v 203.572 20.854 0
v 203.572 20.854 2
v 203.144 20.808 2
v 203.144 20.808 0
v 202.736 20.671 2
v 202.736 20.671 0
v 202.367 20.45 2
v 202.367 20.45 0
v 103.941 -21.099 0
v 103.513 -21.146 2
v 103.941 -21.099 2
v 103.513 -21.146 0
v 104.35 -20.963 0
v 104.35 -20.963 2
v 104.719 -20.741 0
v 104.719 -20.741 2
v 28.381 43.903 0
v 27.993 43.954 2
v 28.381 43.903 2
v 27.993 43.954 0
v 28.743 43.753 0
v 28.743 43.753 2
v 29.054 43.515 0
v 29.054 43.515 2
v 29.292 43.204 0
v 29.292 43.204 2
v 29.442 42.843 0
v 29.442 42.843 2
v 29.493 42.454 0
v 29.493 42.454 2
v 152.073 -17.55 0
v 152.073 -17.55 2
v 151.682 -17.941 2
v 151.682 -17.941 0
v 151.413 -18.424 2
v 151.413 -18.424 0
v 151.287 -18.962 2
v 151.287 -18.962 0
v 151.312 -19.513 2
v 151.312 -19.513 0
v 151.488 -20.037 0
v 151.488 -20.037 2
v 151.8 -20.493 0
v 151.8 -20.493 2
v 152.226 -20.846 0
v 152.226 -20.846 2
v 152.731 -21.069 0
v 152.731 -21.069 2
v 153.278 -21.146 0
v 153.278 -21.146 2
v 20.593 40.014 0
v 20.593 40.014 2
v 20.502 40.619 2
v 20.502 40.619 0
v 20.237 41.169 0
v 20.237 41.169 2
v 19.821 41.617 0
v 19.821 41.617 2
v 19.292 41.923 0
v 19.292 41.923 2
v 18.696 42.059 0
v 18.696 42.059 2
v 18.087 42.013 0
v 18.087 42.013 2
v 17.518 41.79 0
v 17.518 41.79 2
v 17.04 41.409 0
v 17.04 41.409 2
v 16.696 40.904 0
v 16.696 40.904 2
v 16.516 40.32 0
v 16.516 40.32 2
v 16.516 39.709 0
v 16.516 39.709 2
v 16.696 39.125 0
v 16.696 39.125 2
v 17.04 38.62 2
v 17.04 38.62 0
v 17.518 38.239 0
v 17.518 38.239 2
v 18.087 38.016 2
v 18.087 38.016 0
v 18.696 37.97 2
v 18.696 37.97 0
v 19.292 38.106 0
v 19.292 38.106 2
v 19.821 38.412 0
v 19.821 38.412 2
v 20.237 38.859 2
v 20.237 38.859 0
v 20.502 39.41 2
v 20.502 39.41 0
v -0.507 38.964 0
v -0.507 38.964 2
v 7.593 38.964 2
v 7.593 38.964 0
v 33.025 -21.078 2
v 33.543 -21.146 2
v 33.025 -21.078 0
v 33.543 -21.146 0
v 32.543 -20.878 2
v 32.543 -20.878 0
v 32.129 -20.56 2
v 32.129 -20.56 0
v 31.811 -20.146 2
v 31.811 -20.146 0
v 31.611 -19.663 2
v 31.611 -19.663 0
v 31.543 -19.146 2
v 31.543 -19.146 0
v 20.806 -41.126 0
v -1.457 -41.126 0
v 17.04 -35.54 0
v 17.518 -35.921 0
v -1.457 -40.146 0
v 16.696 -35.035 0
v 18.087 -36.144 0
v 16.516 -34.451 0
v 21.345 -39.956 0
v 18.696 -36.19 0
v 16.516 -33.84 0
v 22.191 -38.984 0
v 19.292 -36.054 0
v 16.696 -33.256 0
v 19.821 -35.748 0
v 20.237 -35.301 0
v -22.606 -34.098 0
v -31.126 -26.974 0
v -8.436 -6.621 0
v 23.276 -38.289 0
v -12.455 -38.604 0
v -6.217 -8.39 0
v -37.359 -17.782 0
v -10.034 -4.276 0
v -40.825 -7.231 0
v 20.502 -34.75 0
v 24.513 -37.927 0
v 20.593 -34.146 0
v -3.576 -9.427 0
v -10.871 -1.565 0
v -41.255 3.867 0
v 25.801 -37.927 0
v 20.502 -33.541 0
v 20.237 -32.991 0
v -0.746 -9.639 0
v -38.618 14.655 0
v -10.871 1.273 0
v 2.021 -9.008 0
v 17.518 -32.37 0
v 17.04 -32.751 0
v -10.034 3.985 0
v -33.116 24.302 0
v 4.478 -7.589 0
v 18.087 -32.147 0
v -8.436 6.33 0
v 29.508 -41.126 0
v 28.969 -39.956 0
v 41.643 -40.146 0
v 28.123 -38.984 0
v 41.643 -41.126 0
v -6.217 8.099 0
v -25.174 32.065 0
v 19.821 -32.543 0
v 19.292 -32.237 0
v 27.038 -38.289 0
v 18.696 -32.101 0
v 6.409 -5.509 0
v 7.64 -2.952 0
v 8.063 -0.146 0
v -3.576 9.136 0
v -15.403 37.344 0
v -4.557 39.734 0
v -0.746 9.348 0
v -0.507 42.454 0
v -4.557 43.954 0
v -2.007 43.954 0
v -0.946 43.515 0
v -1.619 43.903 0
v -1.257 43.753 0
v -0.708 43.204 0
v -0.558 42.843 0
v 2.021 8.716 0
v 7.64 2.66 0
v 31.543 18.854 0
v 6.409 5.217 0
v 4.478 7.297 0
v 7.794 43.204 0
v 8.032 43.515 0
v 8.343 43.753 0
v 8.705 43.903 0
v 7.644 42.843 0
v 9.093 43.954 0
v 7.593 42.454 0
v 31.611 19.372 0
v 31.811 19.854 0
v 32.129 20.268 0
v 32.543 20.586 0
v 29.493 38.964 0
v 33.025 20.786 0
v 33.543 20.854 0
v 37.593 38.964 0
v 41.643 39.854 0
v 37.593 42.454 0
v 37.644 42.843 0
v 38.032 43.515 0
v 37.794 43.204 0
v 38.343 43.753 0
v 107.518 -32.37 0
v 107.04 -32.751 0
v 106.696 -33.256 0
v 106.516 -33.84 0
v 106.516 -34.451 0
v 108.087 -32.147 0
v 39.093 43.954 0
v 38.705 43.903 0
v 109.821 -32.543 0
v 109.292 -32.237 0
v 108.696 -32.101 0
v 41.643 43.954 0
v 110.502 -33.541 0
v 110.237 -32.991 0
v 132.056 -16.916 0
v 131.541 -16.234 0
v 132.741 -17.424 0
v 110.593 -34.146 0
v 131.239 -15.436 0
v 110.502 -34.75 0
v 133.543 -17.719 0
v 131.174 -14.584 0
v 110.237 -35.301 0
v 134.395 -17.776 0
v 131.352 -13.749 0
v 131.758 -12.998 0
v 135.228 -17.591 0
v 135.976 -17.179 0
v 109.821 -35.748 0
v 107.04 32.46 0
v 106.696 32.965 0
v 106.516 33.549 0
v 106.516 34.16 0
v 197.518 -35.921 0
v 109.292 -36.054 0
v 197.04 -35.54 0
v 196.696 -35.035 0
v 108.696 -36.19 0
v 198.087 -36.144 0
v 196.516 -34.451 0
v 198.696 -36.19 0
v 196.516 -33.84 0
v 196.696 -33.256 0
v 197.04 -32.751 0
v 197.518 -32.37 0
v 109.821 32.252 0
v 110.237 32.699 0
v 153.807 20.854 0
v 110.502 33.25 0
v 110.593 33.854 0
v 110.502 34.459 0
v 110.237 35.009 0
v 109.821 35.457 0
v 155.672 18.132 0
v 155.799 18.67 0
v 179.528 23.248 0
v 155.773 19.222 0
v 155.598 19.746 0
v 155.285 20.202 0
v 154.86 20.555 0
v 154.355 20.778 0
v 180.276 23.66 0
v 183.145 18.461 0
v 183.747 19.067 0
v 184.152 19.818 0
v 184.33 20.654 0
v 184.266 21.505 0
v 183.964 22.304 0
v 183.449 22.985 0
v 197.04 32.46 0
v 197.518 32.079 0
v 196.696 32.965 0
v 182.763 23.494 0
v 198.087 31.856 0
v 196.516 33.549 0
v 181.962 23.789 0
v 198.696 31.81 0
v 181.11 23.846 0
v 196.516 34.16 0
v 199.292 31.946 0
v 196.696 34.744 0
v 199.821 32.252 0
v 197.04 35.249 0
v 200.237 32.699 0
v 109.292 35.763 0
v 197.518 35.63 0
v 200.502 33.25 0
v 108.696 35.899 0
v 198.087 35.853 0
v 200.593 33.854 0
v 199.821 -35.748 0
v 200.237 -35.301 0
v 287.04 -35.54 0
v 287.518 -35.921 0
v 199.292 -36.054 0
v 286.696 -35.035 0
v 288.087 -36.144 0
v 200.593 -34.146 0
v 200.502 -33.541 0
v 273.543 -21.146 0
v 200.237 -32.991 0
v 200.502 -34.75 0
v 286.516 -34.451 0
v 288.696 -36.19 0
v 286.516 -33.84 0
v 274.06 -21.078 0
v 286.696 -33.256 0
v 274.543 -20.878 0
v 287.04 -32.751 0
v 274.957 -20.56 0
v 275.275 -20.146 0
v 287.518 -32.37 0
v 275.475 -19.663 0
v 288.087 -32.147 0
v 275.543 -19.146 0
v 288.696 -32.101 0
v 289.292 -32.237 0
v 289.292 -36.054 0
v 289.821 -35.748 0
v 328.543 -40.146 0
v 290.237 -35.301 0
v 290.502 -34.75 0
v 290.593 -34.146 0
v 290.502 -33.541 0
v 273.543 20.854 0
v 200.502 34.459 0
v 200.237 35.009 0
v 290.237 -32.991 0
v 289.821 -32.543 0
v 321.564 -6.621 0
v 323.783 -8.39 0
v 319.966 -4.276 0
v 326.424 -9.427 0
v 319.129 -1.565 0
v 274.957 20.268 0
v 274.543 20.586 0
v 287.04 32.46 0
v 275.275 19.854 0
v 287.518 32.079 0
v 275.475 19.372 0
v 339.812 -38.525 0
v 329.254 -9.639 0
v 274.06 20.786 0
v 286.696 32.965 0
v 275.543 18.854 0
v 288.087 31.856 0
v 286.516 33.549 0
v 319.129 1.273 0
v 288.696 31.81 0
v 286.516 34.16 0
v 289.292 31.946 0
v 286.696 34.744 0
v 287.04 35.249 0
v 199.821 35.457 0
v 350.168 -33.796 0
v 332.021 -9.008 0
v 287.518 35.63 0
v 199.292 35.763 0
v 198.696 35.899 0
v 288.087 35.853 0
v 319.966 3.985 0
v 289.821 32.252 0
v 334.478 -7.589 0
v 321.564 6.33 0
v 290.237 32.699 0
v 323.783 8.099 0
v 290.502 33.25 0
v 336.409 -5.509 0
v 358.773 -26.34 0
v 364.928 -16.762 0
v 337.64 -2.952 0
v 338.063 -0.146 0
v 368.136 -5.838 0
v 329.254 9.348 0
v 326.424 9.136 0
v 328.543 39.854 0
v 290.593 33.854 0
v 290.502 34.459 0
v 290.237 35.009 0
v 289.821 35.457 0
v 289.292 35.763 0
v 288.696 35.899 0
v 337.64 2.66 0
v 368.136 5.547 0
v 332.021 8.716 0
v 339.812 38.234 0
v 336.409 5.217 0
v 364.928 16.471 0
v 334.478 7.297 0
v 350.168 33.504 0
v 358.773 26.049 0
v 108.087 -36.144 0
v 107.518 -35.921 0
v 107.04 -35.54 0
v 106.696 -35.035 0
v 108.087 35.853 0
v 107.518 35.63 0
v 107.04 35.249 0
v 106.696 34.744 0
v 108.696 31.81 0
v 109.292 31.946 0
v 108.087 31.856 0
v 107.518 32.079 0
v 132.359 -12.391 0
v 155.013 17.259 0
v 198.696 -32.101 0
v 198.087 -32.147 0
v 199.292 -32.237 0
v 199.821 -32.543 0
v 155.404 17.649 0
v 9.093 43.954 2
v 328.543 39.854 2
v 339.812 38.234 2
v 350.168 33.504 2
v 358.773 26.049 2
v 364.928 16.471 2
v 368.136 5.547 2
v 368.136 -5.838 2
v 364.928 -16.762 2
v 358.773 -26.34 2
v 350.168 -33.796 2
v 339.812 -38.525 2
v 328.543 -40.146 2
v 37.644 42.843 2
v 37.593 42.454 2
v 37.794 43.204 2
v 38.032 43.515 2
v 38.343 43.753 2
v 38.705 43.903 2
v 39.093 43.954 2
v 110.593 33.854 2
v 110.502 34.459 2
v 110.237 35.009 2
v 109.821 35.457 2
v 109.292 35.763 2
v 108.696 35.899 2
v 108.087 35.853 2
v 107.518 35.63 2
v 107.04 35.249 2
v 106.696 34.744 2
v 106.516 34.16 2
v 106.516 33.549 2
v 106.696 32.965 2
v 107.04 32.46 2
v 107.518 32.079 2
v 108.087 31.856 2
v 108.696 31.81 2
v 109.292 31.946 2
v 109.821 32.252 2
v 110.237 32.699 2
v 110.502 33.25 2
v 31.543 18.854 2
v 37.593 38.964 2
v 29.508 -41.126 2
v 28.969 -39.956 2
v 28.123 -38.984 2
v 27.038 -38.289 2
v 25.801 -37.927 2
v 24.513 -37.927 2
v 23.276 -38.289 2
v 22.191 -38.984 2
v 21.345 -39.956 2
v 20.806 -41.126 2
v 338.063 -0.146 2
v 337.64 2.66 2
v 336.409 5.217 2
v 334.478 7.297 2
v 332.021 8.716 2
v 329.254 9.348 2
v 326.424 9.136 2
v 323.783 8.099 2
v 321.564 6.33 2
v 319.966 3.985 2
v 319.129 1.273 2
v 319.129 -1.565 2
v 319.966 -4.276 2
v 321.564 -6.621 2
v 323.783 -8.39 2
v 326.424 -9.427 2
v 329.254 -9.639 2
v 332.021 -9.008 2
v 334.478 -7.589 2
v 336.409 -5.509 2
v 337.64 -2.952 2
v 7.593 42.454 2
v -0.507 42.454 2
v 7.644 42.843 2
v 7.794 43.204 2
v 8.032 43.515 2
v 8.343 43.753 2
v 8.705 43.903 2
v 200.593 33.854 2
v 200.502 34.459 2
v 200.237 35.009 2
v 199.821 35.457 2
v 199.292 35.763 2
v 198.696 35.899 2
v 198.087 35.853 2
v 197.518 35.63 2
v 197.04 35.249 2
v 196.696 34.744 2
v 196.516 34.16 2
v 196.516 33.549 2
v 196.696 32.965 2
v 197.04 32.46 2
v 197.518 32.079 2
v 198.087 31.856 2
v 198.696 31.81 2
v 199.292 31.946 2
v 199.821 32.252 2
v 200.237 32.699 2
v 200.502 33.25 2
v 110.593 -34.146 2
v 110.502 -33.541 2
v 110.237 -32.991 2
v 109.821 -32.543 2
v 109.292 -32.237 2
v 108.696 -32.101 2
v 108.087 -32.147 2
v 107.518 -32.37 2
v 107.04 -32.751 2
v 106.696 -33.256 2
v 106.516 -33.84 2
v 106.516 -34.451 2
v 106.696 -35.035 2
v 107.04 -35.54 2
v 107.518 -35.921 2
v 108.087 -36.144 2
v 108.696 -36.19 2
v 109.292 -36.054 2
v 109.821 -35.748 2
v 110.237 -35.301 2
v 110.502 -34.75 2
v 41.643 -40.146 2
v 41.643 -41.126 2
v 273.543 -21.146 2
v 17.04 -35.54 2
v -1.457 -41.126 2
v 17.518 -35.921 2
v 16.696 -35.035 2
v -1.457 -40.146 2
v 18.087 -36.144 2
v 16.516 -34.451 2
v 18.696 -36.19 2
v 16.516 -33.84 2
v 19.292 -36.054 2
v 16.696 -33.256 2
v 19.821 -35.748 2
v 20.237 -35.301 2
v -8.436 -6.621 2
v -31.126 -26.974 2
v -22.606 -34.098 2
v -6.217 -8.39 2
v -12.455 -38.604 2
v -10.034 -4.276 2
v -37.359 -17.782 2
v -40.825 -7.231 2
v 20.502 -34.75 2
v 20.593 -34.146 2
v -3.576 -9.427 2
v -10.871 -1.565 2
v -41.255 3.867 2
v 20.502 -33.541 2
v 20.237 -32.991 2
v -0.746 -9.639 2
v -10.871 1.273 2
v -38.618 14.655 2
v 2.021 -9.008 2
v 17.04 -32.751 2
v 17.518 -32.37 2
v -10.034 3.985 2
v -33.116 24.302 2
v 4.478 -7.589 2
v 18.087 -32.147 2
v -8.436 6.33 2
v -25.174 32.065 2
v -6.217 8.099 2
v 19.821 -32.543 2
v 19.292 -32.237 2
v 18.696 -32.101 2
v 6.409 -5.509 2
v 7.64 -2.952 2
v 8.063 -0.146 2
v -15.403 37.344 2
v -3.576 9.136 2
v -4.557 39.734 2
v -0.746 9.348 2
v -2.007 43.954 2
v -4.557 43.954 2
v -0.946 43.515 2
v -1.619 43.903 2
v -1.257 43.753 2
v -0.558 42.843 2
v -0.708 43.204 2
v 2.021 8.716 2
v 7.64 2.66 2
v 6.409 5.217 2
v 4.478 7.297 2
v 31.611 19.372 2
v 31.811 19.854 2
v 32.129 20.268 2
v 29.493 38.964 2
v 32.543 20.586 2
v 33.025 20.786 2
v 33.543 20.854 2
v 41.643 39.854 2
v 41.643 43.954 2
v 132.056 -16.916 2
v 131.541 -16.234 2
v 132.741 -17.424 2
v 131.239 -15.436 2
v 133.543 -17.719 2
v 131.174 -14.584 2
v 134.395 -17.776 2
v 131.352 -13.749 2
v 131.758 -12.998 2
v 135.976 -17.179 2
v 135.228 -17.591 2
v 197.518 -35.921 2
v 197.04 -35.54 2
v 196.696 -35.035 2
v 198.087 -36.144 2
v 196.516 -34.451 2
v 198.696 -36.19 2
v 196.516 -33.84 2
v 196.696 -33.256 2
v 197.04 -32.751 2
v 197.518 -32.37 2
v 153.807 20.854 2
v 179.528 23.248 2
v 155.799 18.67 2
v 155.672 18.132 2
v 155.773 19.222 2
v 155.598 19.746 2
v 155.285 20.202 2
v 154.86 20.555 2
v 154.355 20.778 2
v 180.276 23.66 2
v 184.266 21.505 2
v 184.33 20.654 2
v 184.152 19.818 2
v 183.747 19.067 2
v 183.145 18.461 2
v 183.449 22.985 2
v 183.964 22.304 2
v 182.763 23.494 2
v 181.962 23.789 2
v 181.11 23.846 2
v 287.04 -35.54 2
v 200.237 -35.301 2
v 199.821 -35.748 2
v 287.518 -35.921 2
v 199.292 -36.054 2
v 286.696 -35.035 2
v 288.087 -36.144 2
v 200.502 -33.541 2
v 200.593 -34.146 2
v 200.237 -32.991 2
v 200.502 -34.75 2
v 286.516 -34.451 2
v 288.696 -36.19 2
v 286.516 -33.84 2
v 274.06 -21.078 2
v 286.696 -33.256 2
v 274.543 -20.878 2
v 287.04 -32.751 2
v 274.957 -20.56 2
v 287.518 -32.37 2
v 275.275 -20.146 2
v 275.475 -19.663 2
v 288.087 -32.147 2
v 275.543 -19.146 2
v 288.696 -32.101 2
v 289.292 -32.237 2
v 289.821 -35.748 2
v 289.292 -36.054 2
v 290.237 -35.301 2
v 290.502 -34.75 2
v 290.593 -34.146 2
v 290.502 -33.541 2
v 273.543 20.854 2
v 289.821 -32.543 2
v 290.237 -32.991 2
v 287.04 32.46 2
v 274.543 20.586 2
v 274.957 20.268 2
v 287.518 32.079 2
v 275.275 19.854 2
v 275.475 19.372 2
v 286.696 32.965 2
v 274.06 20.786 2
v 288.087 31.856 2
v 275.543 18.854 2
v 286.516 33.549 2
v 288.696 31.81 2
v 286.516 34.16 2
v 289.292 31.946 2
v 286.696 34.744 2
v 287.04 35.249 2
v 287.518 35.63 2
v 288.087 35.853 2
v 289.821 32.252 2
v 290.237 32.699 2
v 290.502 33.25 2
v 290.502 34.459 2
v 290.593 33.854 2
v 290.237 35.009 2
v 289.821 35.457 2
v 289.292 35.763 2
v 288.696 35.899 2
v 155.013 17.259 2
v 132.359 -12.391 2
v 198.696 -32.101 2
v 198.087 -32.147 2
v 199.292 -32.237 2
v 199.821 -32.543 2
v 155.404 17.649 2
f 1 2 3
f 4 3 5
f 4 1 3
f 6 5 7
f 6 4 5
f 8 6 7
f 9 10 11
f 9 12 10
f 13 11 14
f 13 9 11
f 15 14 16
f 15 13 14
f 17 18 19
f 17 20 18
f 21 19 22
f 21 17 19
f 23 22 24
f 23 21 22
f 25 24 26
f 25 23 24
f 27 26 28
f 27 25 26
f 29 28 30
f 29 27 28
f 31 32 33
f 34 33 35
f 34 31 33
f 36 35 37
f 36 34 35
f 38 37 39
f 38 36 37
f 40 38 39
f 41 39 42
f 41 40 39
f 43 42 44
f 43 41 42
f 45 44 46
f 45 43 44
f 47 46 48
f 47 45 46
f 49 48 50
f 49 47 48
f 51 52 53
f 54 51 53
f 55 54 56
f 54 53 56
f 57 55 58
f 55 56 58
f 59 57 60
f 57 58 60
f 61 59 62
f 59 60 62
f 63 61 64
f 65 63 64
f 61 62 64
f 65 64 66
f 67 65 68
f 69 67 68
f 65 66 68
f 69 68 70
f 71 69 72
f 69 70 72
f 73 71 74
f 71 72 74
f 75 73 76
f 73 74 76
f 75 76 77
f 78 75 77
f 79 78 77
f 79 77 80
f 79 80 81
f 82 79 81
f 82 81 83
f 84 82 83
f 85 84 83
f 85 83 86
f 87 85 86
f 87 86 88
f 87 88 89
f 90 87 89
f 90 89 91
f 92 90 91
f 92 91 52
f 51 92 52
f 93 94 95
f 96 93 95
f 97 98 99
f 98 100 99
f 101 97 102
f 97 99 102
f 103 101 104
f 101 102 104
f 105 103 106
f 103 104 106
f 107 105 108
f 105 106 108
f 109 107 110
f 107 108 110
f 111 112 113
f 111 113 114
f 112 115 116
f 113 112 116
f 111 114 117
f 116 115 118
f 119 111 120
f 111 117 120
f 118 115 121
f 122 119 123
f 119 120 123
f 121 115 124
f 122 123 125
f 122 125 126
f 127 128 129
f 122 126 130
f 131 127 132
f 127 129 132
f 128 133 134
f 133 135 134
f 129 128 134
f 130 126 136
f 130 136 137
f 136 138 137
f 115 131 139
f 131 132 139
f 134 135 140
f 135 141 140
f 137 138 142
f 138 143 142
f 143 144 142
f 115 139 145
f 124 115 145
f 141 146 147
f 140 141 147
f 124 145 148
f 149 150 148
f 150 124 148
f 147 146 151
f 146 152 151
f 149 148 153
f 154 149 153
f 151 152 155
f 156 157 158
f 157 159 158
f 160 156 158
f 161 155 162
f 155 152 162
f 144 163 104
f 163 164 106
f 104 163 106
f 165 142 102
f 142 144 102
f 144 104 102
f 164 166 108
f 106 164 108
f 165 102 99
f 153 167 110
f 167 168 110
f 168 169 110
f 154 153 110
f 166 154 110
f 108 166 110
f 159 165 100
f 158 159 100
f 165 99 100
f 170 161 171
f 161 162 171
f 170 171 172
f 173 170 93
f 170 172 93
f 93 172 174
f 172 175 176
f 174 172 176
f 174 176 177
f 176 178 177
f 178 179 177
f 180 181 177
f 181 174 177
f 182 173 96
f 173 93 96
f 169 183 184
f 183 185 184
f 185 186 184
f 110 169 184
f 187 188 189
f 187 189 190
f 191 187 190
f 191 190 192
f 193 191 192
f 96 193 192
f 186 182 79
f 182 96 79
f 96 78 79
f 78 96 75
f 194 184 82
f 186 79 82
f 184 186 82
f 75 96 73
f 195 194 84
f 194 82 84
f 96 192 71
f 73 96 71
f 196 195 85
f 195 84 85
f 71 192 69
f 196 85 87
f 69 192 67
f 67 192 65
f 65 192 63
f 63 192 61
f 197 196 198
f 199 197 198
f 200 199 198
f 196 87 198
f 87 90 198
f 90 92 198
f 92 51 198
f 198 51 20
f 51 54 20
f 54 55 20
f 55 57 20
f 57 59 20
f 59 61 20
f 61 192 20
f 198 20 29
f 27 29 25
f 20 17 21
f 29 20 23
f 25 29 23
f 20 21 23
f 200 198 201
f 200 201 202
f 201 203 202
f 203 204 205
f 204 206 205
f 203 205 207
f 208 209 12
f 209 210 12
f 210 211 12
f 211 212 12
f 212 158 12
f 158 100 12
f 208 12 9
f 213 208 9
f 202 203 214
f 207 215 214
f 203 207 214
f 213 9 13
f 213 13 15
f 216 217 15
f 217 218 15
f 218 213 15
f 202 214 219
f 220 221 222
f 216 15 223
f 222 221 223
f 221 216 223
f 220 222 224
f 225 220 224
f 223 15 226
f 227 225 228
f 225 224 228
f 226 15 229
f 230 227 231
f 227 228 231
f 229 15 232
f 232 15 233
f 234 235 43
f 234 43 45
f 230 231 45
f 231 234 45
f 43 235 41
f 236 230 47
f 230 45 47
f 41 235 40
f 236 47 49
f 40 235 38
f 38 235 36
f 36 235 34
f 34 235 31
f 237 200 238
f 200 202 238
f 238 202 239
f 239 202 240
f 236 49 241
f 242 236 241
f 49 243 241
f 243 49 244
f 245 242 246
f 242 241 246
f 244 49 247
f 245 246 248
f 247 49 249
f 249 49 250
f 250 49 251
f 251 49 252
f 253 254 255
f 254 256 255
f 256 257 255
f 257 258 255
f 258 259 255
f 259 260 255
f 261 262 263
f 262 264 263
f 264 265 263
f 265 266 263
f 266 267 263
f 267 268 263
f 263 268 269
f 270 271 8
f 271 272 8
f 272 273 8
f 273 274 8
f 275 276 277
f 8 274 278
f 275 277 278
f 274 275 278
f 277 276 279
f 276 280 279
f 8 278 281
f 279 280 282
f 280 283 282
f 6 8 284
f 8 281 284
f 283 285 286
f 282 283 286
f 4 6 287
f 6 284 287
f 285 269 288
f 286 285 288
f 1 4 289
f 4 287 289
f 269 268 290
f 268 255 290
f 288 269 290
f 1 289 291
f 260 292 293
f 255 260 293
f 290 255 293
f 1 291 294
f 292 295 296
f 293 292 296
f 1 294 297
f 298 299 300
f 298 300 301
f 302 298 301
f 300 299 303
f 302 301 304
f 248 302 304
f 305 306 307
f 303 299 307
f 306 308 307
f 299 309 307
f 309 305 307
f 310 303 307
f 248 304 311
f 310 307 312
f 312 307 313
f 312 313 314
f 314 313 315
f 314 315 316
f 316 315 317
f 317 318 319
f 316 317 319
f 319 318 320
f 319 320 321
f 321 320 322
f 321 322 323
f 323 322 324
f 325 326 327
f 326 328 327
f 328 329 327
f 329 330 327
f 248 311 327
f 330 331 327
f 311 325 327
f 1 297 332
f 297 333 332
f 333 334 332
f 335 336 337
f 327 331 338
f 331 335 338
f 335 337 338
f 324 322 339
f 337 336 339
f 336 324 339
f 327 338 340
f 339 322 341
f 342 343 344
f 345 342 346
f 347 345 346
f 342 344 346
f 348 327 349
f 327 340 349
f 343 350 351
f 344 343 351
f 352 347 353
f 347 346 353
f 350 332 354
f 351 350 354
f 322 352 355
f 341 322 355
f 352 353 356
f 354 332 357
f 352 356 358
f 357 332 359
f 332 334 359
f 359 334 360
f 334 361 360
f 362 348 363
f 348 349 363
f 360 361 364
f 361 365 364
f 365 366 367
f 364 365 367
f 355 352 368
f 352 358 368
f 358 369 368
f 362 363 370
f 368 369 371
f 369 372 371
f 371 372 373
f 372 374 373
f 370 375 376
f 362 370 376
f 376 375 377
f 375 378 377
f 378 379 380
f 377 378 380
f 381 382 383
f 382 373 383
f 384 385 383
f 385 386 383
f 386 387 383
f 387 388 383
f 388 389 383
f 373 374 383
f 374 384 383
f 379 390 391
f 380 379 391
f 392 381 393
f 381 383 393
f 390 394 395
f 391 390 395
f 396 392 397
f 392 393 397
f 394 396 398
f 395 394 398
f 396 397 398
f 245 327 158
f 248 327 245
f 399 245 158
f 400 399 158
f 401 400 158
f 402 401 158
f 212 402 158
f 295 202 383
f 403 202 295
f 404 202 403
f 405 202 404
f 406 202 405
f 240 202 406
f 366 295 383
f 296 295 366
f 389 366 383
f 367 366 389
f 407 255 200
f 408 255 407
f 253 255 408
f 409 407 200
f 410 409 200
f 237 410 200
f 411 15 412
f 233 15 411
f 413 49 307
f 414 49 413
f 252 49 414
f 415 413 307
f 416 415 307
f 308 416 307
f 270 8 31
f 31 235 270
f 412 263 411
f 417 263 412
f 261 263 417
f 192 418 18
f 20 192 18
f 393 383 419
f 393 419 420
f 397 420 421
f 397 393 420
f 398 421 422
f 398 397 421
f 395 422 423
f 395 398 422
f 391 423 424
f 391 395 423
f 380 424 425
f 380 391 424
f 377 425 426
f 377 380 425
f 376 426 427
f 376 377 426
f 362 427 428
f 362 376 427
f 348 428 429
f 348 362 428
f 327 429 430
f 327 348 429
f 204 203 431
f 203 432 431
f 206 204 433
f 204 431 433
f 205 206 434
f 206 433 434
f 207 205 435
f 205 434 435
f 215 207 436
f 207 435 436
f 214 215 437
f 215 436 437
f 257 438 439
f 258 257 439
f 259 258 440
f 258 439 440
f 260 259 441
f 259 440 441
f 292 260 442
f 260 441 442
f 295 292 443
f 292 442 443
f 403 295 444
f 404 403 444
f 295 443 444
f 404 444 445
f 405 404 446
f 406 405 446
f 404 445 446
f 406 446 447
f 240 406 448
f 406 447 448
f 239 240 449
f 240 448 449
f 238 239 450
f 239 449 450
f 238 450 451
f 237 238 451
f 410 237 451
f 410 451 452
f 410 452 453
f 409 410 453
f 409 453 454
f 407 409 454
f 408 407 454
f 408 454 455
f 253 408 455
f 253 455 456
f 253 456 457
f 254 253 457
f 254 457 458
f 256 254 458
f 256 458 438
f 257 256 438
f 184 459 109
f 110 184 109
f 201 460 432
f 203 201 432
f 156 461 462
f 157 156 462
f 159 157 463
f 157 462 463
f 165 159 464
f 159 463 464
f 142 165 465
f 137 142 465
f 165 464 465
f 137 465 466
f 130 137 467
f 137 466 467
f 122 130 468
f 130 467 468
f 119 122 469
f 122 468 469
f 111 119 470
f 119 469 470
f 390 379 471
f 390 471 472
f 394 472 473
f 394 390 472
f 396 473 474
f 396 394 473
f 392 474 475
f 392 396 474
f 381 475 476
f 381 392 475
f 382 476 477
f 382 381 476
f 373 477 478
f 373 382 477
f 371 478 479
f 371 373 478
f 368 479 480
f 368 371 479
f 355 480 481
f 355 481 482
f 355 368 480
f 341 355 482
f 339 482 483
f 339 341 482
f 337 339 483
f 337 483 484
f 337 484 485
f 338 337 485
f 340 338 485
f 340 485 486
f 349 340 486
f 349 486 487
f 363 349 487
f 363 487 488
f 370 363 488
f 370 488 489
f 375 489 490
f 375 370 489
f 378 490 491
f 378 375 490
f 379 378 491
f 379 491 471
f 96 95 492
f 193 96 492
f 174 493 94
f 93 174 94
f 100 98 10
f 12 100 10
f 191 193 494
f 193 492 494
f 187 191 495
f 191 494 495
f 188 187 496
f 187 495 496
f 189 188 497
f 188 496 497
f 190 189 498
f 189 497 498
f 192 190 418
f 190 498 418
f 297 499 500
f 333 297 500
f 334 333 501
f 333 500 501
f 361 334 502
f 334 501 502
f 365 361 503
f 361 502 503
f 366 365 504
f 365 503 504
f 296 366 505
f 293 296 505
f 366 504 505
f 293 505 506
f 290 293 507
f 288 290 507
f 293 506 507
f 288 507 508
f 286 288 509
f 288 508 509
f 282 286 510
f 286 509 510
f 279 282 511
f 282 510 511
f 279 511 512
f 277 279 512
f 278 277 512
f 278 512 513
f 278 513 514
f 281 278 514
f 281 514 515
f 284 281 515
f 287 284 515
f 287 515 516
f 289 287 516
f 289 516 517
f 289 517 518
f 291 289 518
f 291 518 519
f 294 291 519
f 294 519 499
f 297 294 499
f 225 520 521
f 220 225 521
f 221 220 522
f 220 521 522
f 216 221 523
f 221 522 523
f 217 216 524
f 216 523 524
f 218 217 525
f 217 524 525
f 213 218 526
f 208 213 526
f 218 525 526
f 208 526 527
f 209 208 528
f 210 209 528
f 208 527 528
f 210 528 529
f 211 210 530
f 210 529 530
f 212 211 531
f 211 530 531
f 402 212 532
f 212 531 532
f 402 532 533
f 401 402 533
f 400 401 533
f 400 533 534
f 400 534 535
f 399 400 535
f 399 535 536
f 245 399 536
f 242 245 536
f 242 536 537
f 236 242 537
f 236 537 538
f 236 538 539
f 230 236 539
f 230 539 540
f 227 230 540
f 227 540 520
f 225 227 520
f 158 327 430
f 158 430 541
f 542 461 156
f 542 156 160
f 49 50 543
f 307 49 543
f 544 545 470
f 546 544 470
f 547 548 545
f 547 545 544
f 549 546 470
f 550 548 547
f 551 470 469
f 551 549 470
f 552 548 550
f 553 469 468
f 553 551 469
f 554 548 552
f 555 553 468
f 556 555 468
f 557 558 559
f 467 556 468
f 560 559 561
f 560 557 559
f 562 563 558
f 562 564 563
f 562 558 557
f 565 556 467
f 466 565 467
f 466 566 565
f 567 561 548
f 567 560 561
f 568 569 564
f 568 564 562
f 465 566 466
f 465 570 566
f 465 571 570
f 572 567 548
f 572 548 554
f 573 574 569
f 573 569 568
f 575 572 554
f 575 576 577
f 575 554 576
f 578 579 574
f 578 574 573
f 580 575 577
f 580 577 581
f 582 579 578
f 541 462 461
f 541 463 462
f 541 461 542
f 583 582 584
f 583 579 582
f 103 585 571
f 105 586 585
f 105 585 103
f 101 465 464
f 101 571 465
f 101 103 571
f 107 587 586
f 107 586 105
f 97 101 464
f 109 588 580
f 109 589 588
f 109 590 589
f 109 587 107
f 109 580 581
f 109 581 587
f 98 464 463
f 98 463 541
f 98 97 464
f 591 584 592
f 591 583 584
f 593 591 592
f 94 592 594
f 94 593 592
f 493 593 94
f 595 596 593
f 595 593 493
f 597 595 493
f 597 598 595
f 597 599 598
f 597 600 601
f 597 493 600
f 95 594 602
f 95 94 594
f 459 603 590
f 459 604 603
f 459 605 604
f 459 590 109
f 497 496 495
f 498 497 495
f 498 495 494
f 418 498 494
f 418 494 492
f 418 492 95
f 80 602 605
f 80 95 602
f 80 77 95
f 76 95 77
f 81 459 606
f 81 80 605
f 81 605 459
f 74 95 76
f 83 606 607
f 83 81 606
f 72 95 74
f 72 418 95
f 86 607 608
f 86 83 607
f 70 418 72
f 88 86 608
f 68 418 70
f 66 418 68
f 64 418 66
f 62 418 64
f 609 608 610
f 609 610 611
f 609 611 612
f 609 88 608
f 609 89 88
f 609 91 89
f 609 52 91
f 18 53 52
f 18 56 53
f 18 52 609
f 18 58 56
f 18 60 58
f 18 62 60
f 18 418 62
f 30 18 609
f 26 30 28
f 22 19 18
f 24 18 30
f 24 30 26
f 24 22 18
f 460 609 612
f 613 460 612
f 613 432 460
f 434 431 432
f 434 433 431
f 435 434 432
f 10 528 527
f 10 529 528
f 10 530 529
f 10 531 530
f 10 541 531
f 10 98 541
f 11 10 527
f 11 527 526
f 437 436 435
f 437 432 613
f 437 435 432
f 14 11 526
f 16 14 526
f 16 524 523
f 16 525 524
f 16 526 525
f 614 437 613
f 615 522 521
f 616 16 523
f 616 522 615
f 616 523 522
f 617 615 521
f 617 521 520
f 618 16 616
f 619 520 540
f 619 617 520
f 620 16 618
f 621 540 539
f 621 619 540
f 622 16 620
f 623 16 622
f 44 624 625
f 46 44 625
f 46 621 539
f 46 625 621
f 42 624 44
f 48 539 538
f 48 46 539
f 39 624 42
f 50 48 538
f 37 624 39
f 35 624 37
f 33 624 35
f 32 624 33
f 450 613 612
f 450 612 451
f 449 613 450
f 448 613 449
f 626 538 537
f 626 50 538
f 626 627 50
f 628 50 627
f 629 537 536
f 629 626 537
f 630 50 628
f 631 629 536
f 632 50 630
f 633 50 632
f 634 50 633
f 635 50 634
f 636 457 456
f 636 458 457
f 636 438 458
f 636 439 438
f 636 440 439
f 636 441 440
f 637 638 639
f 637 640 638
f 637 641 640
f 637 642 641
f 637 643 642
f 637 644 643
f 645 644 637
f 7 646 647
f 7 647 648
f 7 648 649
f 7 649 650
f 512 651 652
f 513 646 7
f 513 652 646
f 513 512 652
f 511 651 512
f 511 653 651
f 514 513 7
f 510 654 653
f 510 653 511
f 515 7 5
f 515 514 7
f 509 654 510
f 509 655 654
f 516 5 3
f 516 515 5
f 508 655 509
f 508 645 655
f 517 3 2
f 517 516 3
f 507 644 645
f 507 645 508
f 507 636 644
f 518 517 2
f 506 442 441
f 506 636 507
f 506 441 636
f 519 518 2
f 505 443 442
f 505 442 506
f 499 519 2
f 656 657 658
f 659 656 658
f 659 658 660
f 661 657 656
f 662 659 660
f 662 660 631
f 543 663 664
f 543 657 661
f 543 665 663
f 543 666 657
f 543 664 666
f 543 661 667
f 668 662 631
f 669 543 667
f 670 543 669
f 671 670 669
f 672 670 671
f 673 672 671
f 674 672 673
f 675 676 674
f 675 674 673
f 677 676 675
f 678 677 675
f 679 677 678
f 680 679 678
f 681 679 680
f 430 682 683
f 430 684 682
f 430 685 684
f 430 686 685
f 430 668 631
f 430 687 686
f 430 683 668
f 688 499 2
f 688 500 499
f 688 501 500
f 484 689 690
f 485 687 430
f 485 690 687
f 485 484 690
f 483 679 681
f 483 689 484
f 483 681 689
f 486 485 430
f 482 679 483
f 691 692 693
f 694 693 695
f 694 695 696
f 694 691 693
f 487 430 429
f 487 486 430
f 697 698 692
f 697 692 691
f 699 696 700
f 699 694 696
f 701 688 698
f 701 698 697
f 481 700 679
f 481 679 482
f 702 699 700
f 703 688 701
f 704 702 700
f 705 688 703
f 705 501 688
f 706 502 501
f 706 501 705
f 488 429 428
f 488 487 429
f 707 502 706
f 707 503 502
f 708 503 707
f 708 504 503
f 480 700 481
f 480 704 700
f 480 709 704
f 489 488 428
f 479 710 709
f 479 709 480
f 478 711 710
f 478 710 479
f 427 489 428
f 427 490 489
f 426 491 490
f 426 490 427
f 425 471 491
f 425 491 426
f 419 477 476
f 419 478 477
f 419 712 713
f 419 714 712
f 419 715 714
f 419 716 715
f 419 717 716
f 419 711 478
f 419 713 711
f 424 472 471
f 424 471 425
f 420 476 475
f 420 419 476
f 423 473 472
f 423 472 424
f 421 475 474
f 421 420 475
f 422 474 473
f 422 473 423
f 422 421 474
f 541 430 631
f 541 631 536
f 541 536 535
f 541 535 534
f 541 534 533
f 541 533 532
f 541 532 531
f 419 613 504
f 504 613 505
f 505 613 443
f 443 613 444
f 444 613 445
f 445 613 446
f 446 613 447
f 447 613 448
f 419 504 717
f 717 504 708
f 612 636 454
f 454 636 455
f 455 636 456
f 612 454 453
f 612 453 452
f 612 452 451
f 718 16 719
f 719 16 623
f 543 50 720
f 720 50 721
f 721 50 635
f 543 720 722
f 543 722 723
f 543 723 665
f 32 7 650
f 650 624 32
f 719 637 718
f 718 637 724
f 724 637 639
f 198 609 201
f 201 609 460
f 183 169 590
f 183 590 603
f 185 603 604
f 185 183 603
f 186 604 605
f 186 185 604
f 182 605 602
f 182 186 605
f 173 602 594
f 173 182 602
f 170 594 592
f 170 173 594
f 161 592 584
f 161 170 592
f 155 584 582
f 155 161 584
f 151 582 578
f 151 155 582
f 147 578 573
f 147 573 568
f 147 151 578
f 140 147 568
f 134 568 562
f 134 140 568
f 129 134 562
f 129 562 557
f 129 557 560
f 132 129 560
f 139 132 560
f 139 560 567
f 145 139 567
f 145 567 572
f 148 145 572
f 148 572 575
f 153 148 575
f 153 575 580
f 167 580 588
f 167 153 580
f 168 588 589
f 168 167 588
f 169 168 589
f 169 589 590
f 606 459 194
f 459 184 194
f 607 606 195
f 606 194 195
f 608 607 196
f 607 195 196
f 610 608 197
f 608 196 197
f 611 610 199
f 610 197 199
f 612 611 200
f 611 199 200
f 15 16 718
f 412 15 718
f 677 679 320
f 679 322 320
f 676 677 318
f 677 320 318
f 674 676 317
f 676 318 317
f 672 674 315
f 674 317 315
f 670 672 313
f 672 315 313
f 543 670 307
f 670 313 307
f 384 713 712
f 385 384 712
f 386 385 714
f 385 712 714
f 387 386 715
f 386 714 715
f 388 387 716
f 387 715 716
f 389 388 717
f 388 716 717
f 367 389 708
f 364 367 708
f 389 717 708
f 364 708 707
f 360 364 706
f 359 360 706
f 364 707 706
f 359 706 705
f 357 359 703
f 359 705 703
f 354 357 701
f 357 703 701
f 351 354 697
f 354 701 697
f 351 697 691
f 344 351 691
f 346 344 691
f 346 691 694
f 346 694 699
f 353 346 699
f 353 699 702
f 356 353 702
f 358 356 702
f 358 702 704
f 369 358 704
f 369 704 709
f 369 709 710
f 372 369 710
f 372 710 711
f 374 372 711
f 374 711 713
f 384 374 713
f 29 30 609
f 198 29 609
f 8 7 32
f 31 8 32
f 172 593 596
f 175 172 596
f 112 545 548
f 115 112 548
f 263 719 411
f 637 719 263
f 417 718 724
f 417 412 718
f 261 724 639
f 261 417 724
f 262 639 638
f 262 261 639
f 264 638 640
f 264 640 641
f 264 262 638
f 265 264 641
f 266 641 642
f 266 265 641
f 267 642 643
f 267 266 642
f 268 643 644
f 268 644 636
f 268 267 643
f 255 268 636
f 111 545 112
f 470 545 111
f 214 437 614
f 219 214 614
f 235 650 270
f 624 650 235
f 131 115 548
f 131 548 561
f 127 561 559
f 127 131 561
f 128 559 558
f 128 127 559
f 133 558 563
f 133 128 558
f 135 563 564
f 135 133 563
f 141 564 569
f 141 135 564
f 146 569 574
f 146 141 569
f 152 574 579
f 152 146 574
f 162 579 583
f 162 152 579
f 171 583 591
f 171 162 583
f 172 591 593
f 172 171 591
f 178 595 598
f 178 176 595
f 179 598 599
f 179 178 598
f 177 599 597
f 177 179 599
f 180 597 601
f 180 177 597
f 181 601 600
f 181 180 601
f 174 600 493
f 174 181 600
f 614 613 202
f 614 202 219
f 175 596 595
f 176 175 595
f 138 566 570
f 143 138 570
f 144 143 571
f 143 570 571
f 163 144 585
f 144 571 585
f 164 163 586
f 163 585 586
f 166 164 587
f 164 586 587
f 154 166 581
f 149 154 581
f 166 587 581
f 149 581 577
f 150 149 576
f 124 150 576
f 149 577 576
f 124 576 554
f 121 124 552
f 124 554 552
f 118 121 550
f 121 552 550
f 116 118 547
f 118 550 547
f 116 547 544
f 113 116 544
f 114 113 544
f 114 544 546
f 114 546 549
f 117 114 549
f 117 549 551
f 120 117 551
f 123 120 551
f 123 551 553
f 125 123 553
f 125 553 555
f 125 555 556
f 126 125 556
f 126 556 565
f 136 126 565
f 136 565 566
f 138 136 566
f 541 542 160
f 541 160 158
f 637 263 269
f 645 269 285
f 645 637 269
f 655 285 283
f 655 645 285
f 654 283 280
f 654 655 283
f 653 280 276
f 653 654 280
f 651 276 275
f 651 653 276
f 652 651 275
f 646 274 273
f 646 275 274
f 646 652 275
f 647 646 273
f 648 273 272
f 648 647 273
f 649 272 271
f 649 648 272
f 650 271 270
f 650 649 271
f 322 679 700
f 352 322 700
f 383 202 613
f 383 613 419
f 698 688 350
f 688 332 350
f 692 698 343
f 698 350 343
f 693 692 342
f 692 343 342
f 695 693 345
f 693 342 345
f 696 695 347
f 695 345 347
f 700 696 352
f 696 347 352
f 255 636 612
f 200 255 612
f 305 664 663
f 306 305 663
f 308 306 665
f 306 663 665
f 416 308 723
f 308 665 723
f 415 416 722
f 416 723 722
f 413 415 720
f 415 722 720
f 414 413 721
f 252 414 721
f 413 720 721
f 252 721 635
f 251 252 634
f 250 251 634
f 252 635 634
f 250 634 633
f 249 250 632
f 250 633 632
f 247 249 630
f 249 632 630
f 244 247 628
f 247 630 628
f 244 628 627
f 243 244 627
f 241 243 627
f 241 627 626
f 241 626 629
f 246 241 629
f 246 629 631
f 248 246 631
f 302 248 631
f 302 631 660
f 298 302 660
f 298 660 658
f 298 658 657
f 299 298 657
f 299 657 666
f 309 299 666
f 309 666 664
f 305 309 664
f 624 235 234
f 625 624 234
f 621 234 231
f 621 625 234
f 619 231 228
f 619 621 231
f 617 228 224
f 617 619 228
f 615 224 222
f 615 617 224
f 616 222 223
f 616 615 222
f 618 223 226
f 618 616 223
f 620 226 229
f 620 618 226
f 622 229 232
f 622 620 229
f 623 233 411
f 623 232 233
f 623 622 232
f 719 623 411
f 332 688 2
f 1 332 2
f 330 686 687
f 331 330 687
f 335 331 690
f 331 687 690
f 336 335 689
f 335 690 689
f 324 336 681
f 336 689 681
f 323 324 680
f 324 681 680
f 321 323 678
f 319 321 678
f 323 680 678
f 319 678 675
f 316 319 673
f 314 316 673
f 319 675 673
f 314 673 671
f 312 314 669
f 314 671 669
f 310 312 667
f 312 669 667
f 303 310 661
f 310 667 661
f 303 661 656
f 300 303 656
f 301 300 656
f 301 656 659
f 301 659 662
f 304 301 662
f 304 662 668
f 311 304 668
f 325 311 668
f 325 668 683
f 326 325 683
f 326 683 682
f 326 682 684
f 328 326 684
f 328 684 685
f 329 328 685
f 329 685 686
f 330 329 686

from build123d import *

# Parameters (mm, degrees)
SKETCH_1_R          = 9.52
EXTRUDE_1_DEPTH     = 2
SKETCH_4_W          = 43.1
SKETCH_4_H          = 0.98
SKETCH_4_W_2        = 46.2
SKETCH_4_H_2        = 8.602857229
EXTRUDE_2_DEPTH     = 2
SKETCH_2_R          = 2.05
CUT_EXTRUDE_1_DEPTH = 4
CUT_EXTRUDE_2_DEPTH = 10
FILLET_1_R          = 2
CUT_EXTRUDE_3_DEPTH = 2
FILLET_2_R          = 1.5


with BuildPart() as part:
    # 草图1 → 凸台-拉伸1 (new body)
    with BuildSketch(Plane.XY):
        with BuildLine():
            Line((328.542857143, -40.145714286), (-1.457142857, -40.145714286))
            ThreePointArc((-1.457142857, -40.145714286), (-41.457142857, -0.145714286), (-1.457142857, 39.854285714))
            Line((-1.457142857, 39.854285714), (328.542857143, 39.854285714))
            ThreePointArc((328.542857143, 39.854285714), (368.542857143, -0.145714286), (328.542857143, -40.145714286))
        make_face()
        with Locations((-1.457142857, -0.145714286)):
            Circle(SKETCH_1_R, mode=Mode.SUBTRACT)
        with Locations((328.542857143, -0.145714286)):
            Circle(SKETCH_1_R, mode=Mode.SUBTRACT)
    extrude(amount=EXTRUDE_1_DEPTH)

    # 草图4 → 凸台-拉伸2 (add)
    with BuildSketch(Plane.XY.offset(2)):
        with Locations((20.092857143, -40.635714286)):
            Rectangle(SKETCH_4_W, SKETCH_4_H)
        with Locations((18.542857143, 39.652857099)):
            Rectangle(SKETCH_4_W_2, SKETCH_4_H_2)
    extrude(amount=-EXTRUDE_2_DEPTH)

    # 草图2 → 切除-拉伸1 (cut)
    with BuildSketch(Plane.XY.offset(2)):
        with Locations((108.542857143, 33.854285714)):
            Circle(SKETCH_2_R)
        with Locations((198.542857143, 33.854285714)):
            Circle(SKETCH_2_R)
        with Locations((288.542857143, 33.854285714)):
            Circle(SKETCH_2_R)
        with Locations((108.542857143, -34.145714286)):
            Circle(SKETCH_2_R)
        with Locations((198.542857143, -34.145714286)):
            Circle(SKETCH_2_R)
        with Locations((288.542857143, -34.145714286)):
            Circle(SKETCH_2_R)
        with Locations((18.542857143, -34.145714286)):
            Circle(SKETCH_2_R)
        with Locations((18.542857143, 40.014285714)):
            Circle(SKETCH_2_R)
        Polygon((31.542857143, -21.145714286), (104.183898028, -21.145714286), (159.772133322, 20.854285714), (31.542857143, 20.854285714), align=None)
        Polygon((275.542857143, 20.854285714), (202.901816258, 20.854285714), (147.313580964, -21.145714286), (275.542857143, -21.145714286), align=None)
        Polygon((29.492857143, 41.064285714), (29.492857143, 38.964285714), (37.592857143, 38.964285714), (37.592857143, 41.064285714), (37.592857143, 53.579710622), (29.492857143, 53.579710622), align=None)
        Polygon((-0.507142857, 41.064285714), (-0.507142857, 38.964285714), (7.592857143, 38.964285714), (7.592857143, 41.064285714), (7.592857143, 53.579710622), (-0.507142857, 53.579710622), align=None)
    extrude(amount=-CUT_EXTRUDE_1_DEPTH, mode=Mode.SUBTRACT)

    # 草图3 → 切除-拉伸2 (cut)
    with BuildSketch(Plane.XY.offset(2)):
        with BuildLine():
            Line((183.145474057, 18.460683743), (135.97586329, -17.178577727))
            ThreePointArc((135.97586329, -17.178577727), (131.77376205, -16.593475022), (132.358864754, -12.391373783))
            Line((132.358864754, -12.391373783), (179.528475522, 23.247887686))
            ThreePointArc((179.528475522, 23.247887686), (183.730576762, 22.662784982), (183.145474057, 18.460683743))
        make_face()
    extrude(amount=-CUT_EXTRUDE_2_DEPTH, mode=Mode.SUBTRACT)

    # 圆角1
    fillet_1_edges = [part.edges().sort_by_distance(p)[0] for p in [
        (275.542857143, 20.854285714, 1),
        (275.542857143, -21.145714286, 1),
        (147.313580964, -21.145714286, 1),
        (202.901816258, 20.854285714, 1),
        (31.542857143, -21.145714286, 1),
        (31.542857143, 20.854285714, 1),
        (159.772133322, 20.854285714, 1),
        (104.183898028, -21.145714286, 1),
    ]]
    fillet(fillet_1_edges, radius=FILLET_1_R)

    # 草图5 → 切除-拉伸3 (cut)
    with BuildSketch(Plane.XY.offset(2)):
        with BuildLine():
            Line((20.806207352, -41.125714286), (29.507867411, -41.125714286))
            ThreePointArc((29.507867411, -41.125714286), (25.157037382, -37.88123609), (20.806207352, -41.125714286))
        make_face()
    extrude(amount=-CUT_EXTRUDE_3_DEPTH, mode=Mode.SUBTRACT)

    # 圆角2
    fillet_2_edges = [part.edges().sort_by_distance(p)[0] for p in [
        (37.592857143, 43.954285714, 1),
        (29.492857143, 43.954285714, 1),
        (-0.507142857, 43.954285714, 1),
        (7.592857143, 43.954285714, 1),
    ]]
    fillet(fillet_2_edges, radius=FILLET_2_R)


solid = part.part
